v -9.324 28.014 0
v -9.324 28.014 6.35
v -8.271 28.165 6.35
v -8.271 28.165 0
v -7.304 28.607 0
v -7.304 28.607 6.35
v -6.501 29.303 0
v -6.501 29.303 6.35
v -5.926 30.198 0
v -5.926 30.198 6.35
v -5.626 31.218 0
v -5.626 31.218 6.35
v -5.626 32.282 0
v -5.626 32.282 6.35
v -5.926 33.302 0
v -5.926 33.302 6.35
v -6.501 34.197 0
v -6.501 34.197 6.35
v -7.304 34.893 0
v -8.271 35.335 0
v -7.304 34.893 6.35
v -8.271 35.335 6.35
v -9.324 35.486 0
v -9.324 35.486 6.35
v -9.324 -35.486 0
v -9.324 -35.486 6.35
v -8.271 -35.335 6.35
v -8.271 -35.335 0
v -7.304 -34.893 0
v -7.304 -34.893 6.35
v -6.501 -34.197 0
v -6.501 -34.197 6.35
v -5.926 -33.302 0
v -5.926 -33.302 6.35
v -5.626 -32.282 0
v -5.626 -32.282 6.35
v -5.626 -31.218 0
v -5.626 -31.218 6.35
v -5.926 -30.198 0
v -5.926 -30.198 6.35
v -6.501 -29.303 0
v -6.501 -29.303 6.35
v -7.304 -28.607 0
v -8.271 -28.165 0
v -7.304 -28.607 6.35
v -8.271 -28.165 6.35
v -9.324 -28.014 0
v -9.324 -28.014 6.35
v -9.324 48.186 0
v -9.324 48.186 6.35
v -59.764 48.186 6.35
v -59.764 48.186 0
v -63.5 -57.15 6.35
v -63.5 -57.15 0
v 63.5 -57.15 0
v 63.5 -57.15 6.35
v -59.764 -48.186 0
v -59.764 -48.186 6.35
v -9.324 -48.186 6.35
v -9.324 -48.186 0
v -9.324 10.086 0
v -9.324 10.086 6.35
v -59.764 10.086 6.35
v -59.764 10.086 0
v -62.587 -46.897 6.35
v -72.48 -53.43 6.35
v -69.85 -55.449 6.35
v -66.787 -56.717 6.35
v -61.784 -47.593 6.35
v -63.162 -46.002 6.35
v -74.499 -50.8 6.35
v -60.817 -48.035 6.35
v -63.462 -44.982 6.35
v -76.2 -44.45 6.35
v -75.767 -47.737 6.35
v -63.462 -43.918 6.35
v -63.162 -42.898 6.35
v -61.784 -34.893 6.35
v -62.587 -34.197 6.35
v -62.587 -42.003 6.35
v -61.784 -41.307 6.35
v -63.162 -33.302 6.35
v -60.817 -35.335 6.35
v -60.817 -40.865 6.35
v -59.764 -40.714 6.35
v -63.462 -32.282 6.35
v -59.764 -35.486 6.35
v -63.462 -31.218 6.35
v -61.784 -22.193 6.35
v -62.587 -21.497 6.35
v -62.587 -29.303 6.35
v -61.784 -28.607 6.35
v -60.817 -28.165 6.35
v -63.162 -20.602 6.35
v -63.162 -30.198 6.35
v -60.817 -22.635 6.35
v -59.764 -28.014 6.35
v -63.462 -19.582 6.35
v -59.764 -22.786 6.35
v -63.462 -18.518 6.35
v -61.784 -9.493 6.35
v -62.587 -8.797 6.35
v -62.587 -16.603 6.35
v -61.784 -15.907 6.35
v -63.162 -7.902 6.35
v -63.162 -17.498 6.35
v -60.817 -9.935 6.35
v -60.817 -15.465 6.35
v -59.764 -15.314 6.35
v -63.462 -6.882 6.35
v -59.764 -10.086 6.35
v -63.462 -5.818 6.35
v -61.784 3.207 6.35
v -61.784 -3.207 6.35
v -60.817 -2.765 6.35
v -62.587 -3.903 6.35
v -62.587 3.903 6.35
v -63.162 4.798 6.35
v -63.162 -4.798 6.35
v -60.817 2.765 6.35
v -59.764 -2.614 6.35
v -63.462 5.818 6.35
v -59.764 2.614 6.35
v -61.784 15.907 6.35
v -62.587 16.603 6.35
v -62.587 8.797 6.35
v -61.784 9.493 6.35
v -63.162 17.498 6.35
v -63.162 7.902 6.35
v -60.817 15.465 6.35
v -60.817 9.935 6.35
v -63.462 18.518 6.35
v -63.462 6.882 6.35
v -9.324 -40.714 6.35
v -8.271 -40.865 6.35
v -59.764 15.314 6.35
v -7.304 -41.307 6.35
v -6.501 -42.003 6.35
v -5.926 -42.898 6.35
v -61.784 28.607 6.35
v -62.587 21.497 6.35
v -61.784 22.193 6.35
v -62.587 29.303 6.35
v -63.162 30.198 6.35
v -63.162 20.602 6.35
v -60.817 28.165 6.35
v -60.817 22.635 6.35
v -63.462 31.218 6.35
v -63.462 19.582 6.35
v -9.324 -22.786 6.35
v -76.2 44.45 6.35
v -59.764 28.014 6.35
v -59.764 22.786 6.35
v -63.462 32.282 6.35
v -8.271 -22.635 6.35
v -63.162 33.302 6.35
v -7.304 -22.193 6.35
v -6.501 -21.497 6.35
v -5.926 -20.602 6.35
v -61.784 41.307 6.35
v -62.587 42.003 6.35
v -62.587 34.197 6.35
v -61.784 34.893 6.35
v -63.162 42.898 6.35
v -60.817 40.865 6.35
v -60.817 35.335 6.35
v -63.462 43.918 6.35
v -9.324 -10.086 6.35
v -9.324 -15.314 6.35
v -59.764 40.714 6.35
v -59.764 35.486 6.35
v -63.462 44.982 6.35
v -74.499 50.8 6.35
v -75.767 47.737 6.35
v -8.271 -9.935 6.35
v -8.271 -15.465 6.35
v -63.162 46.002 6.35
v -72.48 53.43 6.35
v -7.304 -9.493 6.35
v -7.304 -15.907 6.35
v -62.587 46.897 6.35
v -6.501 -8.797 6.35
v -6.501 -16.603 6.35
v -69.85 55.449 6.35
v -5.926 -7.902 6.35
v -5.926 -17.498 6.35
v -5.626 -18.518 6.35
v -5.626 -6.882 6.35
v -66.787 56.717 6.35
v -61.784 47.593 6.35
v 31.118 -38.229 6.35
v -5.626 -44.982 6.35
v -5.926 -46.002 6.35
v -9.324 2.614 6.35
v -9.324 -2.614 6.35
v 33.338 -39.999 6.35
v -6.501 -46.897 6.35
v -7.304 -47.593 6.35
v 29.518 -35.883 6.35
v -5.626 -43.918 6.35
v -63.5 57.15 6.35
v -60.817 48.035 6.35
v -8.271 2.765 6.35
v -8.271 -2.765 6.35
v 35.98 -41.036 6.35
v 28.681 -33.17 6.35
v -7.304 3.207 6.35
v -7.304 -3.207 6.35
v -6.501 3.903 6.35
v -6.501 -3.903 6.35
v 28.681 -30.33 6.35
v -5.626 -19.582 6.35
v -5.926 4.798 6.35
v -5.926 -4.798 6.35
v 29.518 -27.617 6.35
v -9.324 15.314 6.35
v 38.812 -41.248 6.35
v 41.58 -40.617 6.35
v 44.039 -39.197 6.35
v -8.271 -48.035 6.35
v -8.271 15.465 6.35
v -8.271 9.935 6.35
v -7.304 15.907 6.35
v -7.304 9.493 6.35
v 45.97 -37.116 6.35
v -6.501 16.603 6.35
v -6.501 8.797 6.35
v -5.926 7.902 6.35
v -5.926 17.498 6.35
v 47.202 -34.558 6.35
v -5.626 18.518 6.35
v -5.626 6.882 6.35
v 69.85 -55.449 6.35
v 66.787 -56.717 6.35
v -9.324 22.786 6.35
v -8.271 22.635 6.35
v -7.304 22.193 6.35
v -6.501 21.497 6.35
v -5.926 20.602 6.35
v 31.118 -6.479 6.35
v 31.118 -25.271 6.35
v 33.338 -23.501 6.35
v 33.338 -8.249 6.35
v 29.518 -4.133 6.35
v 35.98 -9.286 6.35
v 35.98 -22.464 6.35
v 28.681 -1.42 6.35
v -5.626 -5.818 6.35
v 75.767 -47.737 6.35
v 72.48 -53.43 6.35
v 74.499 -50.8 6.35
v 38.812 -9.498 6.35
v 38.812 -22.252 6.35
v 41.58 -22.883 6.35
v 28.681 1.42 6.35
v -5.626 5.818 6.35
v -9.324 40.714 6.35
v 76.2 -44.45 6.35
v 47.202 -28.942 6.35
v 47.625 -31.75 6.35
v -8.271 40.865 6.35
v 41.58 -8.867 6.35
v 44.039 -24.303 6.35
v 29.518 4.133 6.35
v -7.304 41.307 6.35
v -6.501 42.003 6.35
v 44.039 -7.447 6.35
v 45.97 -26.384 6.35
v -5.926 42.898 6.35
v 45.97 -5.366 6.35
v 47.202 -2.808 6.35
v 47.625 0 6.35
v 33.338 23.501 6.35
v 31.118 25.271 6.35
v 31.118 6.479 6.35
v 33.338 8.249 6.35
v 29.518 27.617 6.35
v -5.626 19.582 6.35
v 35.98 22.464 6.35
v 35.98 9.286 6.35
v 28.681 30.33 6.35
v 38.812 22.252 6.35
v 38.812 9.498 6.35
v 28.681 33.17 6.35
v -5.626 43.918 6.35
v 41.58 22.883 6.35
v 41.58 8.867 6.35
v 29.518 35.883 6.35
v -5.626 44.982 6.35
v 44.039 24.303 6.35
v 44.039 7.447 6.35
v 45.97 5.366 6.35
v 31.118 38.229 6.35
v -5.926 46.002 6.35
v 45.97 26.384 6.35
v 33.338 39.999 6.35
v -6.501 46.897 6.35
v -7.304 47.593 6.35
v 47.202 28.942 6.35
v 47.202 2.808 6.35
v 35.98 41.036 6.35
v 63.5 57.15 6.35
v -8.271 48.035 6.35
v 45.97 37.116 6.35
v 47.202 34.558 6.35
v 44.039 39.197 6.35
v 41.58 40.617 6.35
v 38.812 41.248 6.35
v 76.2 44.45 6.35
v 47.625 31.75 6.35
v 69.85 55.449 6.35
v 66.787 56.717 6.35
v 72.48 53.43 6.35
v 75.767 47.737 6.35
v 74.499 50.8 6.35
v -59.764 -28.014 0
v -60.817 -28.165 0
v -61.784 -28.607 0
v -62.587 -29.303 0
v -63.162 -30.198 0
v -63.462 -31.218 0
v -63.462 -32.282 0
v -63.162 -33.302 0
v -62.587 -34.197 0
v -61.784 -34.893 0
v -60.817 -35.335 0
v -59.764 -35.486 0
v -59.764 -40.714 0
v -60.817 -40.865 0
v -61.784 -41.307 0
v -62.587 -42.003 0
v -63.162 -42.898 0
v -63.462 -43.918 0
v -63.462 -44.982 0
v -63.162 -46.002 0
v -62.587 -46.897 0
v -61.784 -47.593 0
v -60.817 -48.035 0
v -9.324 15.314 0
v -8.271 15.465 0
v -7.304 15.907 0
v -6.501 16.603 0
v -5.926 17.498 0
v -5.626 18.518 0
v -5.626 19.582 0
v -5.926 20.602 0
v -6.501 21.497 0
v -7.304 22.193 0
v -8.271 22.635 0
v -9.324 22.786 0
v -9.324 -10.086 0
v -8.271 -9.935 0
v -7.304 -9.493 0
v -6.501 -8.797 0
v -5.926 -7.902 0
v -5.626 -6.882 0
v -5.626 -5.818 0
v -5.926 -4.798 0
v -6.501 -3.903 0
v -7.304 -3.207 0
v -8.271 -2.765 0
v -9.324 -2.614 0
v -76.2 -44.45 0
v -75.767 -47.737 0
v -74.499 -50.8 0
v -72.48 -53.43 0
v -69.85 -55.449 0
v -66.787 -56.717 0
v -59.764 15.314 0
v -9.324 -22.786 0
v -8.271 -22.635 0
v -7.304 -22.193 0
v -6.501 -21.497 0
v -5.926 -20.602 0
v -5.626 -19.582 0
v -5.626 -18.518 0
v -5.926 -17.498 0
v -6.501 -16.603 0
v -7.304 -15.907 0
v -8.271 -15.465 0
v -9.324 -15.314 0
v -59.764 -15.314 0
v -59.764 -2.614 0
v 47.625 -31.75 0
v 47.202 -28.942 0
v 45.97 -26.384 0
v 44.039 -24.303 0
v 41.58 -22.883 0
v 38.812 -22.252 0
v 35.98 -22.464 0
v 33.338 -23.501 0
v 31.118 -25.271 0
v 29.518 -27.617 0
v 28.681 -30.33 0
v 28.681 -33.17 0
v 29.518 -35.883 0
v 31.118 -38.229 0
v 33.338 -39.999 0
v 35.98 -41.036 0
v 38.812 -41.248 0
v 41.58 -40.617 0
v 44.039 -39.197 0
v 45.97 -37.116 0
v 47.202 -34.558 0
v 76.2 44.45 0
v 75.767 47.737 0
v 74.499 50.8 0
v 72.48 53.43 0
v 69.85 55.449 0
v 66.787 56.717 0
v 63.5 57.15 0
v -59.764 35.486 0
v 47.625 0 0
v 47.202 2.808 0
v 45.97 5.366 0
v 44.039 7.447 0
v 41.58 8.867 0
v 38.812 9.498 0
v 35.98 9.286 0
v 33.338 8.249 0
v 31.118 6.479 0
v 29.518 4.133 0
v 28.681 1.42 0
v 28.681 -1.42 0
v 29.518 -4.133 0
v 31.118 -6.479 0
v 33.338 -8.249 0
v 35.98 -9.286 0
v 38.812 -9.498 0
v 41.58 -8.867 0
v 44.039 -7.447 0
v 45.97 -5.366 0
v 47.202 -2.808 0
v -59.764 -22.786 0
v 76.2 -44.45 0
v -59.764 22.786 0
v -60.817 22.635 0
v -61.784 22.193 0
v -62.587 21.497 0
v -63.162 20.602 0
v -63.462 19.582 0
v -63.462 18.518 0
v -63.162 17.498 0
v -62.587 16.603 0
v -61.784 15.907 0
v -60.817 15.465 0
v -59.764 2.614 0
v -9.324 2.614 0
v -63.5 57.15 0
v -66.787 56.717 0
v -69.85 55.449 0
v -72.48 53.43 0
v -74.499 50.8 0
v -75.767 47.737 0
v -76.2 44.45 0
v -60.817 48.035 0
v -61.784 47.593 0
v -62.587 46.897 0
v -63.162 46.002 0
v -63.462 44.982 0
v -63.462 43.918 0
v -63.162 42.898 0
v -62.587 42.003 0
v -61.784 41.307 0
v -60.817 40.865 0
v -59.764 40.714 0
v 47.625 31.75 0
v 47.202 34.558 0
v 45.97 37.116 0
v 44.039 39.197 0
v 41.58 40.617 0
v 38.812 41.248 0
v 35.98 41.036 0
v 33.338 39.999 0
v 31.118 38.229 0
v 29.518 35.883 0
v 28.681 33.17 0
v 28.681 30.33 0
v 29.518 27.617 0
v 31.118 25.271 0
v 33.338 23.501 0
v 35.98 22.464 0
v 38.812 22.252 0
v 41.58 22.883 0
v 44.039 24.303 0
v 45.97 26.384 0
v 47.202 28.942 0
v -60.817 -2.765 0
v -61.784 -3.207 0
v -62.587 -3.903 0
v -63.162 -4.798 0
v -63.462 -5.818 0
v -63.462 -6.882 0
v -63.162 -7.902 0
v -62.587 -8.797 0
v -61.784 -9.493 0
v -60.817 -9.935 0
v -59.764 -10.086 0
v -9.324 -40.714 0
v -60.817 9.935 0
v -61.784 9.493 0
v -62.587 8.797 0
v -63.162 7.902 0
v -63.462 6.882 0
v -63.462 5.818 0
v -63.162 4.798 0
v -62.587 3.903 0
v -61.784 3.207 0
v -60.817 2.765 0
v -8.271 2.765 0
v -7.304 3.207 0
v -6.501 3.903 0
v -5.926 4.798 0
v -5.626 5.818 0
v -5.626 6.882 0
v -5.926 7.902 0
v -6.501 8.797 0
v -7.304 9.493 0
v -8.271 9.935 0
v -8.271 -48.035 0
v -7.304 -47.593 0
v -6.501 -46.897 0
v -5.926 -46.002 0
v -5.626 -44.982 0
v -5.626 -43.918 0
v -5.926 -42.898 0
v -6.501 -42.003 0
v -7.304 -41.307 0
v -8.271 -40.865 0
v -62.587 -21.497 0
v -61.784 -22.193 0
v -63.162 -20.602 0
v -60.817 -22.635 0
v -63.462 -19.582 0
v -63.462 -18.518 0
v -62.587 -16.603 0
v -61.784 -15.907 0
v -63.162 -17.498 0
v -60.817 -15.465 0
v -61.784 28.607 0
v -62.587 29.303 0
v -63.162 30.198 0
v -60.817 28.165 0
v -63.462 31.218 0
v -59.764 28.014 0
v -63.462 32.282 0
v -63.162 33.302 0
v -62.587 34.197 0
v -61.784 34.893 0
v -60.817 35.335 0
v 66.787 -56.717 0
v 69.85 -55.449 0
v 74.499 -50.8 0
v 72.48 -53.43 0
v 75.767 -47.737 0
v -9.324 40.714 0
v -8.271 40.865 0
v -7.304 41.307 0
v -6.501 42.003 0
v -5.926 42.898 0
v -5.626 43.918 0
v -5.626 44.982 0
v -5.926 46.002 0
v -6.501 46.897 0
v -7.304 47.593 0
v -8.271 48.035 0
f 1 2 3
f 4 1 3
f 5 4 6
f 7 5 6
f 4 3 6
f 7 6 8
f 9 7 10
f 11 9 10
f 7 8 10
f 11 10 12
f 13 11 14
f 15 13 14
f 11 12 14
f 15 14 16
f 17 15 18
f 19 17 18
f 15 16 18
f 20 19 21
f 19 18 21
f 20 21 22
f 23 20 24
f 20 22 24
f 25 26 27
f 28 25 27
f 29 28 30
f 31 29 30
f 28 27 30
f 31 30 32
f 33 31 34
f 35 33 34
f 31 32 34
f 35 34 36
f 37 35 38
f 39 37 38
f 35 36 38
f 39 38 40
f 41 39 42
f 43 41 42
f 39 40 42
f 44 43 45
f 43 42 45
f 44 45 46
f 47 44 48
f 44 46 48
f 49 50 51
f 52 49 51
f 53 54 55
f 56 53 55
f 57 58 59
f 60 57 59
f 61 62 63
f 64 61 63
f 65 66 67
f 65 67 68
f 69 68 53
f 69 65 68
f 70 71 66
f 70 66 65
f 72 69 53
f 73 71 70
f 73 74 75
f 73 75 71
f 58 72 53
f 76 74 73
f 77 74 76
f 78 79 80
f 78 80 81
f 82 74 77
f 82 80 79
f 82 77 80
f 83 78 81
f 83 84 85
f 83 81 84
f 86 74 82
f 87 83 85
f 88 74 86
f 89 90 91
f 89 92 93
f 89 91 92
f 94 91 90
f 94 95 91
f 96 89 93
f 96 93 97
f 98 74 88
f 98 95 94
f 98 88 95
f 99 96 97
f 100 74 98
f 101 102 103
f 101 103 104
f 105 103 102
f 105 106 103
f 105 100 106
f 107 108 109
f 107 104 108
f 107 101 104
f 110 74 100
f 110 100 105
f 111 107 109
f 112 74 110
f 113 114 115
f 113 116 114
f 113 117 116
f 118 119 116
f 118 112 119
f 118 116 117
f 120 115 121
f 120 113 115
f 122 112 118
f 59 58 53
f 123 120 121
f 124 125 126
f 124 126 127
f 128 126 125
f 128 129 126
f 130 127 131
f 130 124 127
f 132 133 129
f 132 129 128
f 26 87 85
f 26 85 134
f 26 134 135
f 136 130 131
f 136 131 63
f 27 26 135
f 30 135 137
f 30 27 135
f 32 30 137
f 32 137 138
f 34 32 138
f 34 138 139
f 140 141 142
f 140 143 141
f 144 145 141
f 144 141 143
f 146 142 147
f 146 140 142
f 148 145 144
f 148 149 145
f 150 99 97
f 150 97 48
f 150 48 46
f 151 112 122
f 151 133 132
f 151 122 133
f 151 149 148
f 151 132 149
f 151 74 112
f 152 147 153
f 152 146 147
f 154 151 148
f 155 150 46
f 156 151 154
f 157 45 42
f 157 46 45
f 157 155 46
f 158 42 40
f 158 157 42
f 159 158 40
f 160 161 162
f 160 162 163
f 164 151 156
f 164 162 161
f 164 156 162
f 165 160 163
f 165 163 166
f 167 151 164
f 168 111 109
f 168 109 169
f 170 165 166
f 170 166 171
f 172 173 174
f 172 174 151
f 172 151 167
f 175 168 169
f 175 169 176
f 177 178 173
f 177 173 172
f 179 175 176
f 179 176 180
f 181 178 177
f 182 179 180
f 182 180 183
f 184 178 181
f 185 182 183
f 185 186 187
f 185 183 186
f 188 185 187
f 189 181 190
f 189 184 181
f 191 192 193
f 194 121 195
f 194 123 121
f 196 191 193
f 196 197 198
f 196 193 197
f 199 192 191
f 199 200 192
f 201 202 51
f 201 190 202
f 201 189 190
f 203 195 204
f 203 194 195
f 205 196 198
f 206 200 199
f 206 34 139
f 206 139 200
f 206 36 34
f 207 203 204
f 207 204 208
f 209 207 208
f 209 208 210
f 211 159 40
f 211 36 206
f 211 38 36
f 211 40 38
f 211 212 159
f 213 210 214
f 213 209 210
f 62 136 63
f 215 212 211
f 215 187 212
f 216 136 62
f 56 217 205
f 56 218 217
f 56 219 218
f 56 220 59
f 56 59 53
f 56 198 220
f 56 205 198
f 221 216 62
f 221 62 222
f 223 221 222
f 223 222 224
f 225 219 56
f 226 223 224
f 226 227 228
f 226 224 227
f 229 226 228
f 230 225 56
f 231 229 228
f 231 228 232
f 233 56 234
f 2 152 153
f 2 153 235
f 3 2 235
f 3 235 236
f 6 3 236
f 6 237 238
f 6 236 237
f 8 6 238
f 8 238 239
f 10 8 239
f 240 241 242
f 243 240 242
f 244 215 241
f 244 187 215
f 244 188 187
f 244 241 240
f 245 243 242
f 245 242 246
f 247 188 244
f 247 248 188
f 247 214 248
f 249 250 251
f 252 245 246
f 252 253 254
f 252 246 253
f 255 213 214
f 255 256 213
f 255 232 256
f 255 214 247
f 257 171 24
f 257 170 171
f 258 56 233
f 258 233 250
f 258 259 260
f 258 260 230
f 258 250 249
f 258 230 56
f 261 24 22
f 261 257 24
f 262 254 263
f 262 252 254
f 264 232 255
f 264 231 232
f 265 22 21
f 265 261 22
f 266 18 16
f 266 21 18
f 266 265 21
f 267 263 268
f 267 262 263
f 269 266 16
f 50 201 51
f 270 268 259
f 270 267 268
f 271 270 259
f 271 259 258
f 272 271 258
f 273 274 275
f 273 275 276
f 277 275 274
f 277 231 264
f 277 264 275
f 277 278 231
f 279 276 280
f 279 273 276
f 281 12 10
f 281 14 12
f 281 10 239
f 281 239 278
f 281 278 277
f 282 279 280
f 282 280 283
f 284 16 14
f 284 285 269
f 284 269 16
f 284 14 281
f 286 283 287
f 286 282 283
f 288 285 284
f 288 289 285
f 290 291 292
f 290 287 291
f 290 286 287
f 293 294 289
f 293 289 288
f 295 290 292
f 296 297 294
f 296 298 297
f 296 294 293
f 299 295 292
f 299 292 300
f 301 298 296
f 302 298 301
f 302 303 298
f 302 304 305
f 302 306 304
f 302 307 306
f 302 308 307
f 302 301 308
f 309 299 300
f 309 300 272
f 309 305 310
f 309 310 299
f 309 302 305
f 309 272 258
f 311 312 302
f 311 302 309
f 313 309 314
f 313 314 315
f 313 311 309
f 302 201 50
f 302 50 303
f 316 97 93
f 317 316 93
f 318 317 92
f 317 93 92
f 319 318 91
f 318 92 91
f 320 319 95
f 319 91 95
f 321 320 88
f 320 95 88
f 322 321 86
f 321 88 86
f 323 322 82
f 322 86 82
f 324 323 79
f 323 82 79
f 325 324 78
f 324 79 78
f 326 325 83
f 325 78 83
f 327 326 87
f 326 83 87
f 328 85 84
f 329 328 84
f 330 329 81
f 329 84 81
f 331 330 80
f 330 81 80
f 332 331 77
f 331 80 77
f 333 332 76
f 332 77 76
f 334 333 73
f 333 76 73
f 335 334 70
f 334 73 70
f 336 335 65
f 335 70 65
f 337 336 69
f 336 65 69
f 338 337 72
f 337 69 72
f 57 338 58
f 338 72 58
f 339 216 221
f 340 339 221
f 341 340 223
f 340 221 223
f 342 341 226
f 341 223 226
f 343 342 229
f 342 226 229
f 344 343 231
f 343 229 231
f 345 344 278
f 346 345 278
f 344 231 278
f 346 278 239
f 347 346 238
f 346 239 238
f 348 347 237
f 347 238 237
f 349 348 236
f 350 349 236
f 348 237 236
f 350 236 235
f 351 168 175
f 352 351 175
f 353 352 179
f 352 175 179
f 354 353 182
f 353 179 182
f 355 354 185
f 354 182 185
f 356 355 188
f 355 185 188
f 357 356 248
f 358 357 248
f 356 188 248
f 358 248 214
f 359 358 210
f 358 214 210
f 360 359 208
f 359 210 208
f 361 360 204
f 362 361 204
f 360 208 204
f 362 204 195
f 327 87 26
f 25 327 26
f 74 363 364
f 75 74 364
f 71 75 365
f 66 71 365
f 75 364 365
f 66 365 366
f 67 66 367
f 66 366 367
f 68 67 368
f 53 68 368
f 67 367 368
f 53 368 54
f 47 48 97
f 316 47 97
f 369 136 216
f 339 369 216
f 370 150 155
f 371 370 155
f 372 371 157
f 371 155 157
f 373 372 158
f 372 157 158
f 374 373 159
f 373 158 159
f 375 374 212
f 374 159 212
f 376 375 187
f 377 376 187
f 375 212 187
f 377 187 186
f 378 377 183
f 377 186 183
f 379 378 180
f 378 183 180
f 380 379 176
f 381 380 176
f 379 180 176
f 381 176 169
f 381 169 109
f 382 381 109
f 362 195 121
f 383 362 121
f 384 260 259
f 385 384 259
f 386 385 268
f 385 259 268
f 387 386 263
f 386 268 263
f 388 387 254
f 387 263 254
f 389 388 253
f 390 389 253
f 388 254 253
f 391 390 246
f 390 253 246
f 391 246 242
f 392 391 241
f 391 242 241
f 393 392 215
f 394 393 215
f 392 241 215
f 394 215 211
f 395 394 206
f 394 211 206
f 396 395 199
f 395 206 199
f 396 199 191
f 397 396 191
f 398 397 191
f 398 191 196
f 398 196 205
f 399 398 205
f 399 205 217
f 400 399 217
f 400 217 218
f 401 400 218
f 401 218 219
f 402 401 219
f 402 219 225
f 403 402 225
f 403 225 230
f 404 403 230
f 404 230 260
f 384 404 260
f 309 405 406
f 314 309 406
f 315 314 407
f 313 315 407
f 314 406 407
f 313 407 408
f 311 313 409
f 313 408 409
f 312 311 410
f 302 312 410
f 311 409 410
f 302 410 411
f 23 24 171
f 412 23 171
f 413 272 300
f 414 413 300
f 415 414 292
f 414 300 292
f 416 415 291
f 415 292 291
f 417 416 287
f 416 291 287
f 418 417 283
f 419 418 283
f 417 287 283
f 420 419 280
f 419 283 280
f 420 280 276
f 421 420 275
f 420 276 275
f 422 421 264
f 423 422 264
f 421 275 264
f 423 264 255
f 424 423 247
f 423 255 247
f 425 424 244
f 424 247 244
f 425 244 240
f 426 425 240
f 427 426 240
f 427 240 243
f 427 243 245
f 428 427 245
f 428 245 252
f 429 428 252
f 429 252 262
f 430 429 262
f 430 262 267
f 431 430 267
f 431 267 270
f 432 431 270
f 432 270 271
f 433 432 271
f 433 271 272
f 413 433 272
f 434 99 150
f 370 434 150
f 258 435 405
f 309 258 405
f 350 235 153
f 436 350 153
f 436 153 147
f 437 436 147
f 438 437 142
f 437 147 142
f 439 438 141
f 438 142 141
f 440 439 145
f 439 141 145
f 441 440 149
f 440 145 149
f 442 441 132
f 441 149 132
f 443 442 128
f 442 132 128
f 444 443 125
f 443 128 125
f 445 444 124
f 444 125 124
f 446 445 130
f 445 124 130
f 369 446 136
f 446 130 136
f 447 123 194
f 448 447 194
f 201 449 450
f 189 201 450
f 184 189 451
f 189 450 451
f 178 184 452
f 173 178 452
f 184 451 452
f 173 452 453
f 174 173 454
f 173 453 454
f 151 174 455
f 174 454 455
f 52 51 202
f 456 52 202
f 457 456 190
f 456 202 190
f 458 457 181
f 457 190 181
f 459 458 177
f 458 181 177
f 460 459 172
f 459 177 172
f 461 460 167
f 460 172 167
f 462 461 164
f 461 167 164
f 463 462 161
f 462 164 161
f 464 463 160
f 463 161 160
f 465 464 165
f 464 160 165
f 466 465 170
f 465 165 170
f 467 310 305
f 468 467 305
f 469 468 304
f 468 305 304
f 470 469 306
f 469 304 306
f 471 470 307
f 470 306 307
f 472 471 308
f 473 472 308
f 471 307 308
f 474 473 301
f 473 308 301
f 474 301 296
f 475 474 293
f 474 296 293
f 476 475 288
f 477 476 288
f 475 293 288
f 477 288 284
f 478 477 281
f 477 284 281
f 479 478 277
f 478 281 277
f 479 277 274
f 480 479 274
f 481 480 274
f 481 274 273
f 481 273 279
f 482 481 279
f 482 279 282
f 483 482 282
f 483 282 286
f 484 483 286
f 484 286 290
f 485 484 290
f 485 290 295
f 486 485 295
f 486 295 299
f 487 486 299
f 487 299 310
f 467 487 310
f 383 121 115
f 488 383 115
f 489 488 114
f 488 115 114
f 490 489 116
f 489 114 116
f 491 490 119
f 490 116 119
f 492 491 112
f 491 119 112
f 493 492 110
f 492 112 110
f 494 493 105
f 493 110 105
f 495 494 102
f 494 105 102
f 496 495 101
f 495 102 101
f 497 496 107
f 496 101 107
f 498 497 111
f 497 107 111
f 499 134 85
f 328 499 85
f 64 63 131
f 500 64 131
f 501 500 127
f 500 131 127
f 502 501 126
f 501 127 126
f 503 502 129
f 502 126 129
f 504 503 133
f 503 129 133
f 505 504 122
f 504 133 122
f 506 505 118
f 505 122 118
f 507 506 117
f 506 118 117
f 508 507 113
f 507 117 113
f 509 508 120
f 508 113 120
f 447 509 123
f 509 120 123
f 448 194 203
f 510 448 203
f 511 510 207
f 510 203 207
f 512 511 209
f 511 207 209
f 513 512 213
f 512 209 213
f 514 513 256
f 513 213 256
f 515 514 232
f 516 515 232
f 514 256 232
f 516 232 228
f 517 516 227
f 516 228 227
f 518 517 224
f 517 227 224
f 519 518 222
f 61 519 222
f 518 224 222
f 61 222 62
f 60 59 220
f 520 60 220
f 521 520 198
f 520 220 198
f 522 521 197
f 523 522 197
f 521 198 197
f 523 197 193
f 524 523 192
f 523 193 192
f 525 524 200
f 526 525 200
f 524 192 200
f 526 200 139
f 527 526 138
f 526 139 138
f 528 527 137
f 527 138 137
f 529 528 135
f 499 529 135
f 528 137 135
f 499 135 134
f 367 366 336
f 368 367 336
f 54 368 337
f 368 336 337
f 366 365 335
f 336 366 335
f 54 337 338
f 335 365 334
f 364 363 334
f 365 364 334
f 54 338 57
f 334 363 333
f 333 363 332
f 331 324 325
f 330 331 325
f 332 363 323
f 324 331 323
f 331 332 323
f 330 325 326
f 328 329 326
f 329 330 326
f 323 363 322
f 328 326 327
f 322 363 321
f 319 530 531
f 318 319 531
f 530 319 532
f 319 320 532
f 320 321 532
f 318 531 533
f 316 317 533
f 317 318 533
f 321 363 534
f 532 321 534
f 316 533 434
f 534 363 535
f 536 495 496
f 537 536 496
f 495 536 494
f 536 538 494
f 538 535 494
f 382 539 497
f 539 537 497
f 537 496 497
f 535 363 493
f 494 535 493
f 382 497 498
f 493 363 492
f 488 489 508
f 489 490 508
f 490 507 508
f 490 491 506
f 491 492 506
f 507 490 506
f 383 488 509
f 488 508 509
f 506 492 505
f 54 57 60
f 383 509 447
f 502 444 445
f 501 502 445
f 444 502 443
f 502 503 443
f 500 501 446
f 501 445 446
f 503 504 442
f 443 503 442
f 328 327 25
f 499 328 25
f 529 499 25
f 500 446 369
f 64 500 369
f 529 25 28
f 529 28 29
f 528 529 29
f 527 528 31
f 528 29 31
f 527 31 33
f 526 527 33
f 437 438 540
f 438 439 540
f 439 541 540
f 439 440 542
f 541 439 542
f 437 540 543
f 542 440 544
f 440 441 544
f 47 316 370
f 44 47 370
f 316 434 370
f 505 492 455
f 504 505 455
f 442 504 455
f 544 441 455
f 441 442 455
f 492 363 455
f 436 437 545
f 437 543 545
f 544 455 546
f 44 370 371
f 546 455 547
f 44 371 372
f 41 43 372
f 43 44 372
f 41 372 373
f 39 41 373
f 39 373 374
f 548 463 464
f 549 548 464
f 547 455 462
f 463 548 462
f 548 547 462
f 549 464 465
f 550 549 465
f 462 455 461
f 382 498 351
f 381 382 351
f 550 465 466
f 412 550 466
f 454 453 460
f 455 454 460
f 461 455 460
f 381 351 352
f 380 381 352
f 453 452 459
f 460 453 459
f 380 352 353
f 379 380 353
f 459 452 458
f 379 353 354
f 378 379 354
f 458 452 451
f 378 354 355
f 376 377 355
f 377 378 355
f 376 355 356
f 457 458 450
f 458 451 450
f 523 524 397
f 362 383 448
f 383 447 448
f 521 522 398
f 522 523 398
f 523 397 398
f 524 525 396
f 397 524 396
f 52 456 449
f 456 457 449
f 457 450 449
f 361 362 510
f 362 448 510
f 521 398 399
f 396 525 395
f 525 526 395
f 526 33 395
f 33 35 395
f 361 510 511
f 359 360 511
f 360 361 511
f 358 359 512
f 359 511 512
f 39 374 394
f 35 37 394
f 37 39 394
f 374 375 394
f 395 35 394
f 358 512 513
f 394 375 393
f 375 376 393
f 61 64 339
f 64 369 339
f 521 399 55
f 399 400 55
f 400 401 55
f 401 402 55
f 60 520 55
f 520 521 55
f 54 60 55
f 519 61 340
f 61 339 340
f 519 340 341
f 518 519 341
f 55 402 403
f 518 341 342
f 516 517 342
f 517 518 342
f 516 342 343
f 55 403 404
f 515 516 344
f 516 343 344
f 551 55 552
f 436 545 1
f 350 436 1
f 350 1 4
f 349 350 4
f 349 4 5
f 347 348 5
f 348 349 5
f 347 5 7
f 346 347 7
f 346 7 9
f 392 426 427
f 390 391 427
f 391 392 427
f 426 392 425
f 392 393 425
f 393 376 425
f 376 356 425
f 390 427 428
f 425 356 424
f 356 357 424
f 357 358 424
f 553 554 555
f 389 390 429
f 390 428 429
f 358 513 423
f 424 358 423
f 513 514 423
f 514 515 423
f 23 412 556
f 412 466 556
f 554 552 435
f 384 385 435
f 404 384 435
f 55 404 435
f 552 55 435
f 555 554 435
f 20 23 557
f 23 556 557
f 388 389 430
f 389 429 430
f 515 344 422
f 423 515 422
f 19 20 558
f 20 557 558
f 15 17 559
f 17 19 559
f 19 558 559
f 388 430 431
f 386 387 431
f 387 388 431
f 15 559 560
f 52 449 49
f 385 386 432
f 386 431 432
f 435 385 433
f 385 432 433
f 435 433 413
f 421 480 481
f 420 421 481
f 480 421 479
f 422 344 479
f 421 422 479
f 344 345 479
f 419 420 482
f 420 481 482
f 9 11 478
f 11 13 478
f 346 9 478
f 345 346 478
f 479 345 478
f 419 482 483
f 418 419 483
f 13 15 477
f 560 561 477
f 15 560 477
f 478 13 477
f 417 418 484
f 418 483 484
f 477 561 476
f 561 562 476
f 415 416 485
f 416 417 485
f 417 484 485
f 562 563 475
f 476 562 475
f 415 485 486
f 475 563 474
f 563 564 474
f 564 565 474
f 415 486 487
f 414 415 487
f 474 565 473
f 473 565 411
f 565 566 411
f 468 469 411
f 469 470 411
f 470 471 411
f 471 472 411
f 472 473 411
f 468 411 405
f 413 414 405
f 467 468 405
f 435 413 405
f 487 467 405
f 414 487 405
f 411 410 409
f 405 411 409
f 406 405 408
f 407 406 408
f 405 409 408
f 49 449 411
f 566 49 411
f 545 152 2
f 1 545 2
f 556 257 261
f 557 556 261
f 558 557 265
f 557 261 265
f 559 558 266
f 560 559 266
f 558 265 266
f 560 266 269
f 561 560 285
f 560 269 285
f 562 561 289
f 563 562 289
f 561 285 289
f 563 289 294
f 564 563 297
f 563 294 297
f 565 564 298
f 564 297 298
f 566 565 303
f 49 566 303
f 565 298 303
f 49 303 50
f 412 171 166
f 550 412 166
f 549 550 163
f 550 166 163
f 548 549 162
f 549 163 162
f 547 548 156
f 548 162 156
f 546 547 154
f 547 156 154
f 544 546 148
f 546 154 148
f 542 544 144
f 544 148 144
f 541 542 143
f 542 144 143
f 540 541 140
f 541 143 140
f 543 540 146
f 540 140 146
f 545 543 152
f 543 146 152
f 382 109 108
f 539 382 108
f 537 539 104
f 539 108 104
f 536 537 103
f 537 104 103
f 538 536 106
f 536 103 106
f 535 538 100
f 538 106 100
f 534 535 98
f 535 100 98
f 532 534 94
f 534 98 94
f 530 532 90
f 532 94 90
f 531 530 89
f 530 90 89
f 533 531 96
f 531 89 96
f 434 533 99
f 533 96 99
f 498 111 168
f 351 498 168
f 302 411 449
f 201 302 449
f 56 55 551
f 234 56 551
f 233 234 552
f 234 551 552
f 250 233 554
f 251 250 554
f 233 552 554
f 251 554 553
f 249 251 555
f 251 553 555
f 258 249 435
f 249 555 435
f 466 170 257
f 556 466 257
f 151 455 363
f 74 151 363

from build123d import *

# Parameters (mm, degrees)
F1_DEPTH = 6.35
F2_R     = 9.525
F3_DEPTH = 6.351
F5_DEPTH = 6.351


with BuildPart() as f1:
    # F0 (on Top) → F1 (new body)
    with BuildSketch(Plane.XY):
        with BuildLine():
            ThreePointArc((76.2, 44.45), (72.480256, 53.430256), (63.5, 57.15))
            Line((63.5, 57.15), (-63.5, 57.15))
            ThreePointArc((-63.5, 57.15), (-72.480256, 53.430256), (-76.2, 44.45))
            Line((-76.2, 44.45), (-76.2, -44.45))
            ThreePointArc((-76.2, -44.45), (-72.480256, -53.430256), (-63.5, -57.15))
            Line((-63.5, -57.15), (63.5, -57.15))
            ThreePointArc((63.5, -57.15), (72.480256, -53.430256), (76.2, -44.45))
            Line((76.2, -44.45), (76.2, 44.45))
        make_face()
    extrude(amount=F1_DEPTH)

    # F2 (on face) → F3 (cut, through all)
    with BuildSketch(Plane.XY.offset(6.35)):
        with Locations((38.1, 31.75)):
            Circle(F2_R)
        with Locations((38.1, 0)):
            Circle(F2_R)
        with Locations((38.1, -31.75)):
            Circle(F2_R)
    extrude(amount=-F3_DEPTH, mode=Mode.SUBTRACT)

    # F4 (on face) → F5 (cut, through all)
    with BuildSketch(Plane.XY.offset(6.35)):
        with BuildLine():
            Line((-59.763934, -48.186066), (-9.324066, -48.186066))
            ThreePointArc((-9.324066, -48.186066), (-5.588, -44.45), (-9.324066, -40.713934))
            Line((-9.324066, -40.713934), (-59.763934, -40.713934))
            ThreePointArc((-59.763934, -40.713934), (-63.5, -44.45), (-59.763934, -48.186066))
        make_face()
        with BuildLine():
            ThreePointArc((-59.763934, -28.013934), (-63.5, -31.75), (-59.763934, -35.486066))
            Line((-59.763934, -35.486066), (-9.324066, -35.486066))
            ThreePointArc((-9.324066, -35.486066), (-5.588, -31.75), (-9.324066, -28.013934))
            Line((-9.324066, -28.013934), (-59.763934, -28.013934))
        make_face()
        with BuildLine():
            ThreePointArc((-59.763934, -15.313934), (-63.5, -19.05), (-59.763934, -22.786066))
            Line((-59.763934, -22.786066), (-9.324066, -22.786066))
            ThreePointArc((-9.324066, -22.786066), (-5.588, -19.05), (-9.324066, -15.313934))
            Line((-9.324066, -15.313934), (-59.763934, -15.313934))
        make_face()
        with BuildLine():
            ThreePointArc((-59.763934, -2.613934), (-63.5, -6.35), (-59.763934, -10.086066))
            Line((-59.763934, -10.086066), (-9.324066, -10.086066))
            ThreePointArc((-9.324066, -10.086066), (-5.588, -6.35), (-9.324066, -2.613934))
            Line((-9.324066, -2.613934), (-59.763934, -2.613934))
        make_face()
        with BuildLine():
            ThreePointArc((-59.763934, 10.086066), (-63.5, 6.35), (-59.763934, 2.613934))
            Line((-59.763934, 2.613934), (-9.324066, 2.613934))
            ThreePointArc((-9.324066, 2.613934), (-5.588, 6.35), (-9.324066, 10.086066))
            Line((-9.324066, 10.086066), (-59.763934, 10.086066))
        make_face()
        with BuildLine():
            ThreePointArc((-59.763934, 22.786066), (-63.5, 19.05), (-59.763934, 15.313934))
            Line((-59.763934, 15.313934), (-9.324066, 15.313934))
            ThreePointArc((-9.324066, 15.313934), (-5.588, 19.05), (-9.324066, 22.786066))
            Line((-9.324066, 22.786066), (-59.763934, 22.786066))
        make_face()
        with BuildLine():
            ThreePointArc((-59.763934, 35.486066), (-63.5, 31.75), (-59.763934, 28.013934))
            Line((-59.763934, 28.013934), (-9.324066, 28.013934))
            ThreePointArc((-9.324066, 28.013934), (-5.588, 31.75), (-9.324066, 35.486066))
            Line((-9.324066, 35.486066), (-59.763934, 35.486066))
        make_face()
        with BuildLine():
            ThreePointArc((-59.763934, 48.186066), (-63.5, 44.45), (-59.763934, 40.713934))
            Line((-59.763934, 40.713934), (-9.324066, 40.713934))
            ThreePointArc((-9.324066, 40.713934), (-5.588, 44.45), (-9.324066, 48.186066))
            Line((-9.324066, 48.186066), (-59.763934, 48.186066))
        make_face()
    extrude(amount=-F5_DEPTH, mode=Mode.SUBTRACT)


solid = f1.part
